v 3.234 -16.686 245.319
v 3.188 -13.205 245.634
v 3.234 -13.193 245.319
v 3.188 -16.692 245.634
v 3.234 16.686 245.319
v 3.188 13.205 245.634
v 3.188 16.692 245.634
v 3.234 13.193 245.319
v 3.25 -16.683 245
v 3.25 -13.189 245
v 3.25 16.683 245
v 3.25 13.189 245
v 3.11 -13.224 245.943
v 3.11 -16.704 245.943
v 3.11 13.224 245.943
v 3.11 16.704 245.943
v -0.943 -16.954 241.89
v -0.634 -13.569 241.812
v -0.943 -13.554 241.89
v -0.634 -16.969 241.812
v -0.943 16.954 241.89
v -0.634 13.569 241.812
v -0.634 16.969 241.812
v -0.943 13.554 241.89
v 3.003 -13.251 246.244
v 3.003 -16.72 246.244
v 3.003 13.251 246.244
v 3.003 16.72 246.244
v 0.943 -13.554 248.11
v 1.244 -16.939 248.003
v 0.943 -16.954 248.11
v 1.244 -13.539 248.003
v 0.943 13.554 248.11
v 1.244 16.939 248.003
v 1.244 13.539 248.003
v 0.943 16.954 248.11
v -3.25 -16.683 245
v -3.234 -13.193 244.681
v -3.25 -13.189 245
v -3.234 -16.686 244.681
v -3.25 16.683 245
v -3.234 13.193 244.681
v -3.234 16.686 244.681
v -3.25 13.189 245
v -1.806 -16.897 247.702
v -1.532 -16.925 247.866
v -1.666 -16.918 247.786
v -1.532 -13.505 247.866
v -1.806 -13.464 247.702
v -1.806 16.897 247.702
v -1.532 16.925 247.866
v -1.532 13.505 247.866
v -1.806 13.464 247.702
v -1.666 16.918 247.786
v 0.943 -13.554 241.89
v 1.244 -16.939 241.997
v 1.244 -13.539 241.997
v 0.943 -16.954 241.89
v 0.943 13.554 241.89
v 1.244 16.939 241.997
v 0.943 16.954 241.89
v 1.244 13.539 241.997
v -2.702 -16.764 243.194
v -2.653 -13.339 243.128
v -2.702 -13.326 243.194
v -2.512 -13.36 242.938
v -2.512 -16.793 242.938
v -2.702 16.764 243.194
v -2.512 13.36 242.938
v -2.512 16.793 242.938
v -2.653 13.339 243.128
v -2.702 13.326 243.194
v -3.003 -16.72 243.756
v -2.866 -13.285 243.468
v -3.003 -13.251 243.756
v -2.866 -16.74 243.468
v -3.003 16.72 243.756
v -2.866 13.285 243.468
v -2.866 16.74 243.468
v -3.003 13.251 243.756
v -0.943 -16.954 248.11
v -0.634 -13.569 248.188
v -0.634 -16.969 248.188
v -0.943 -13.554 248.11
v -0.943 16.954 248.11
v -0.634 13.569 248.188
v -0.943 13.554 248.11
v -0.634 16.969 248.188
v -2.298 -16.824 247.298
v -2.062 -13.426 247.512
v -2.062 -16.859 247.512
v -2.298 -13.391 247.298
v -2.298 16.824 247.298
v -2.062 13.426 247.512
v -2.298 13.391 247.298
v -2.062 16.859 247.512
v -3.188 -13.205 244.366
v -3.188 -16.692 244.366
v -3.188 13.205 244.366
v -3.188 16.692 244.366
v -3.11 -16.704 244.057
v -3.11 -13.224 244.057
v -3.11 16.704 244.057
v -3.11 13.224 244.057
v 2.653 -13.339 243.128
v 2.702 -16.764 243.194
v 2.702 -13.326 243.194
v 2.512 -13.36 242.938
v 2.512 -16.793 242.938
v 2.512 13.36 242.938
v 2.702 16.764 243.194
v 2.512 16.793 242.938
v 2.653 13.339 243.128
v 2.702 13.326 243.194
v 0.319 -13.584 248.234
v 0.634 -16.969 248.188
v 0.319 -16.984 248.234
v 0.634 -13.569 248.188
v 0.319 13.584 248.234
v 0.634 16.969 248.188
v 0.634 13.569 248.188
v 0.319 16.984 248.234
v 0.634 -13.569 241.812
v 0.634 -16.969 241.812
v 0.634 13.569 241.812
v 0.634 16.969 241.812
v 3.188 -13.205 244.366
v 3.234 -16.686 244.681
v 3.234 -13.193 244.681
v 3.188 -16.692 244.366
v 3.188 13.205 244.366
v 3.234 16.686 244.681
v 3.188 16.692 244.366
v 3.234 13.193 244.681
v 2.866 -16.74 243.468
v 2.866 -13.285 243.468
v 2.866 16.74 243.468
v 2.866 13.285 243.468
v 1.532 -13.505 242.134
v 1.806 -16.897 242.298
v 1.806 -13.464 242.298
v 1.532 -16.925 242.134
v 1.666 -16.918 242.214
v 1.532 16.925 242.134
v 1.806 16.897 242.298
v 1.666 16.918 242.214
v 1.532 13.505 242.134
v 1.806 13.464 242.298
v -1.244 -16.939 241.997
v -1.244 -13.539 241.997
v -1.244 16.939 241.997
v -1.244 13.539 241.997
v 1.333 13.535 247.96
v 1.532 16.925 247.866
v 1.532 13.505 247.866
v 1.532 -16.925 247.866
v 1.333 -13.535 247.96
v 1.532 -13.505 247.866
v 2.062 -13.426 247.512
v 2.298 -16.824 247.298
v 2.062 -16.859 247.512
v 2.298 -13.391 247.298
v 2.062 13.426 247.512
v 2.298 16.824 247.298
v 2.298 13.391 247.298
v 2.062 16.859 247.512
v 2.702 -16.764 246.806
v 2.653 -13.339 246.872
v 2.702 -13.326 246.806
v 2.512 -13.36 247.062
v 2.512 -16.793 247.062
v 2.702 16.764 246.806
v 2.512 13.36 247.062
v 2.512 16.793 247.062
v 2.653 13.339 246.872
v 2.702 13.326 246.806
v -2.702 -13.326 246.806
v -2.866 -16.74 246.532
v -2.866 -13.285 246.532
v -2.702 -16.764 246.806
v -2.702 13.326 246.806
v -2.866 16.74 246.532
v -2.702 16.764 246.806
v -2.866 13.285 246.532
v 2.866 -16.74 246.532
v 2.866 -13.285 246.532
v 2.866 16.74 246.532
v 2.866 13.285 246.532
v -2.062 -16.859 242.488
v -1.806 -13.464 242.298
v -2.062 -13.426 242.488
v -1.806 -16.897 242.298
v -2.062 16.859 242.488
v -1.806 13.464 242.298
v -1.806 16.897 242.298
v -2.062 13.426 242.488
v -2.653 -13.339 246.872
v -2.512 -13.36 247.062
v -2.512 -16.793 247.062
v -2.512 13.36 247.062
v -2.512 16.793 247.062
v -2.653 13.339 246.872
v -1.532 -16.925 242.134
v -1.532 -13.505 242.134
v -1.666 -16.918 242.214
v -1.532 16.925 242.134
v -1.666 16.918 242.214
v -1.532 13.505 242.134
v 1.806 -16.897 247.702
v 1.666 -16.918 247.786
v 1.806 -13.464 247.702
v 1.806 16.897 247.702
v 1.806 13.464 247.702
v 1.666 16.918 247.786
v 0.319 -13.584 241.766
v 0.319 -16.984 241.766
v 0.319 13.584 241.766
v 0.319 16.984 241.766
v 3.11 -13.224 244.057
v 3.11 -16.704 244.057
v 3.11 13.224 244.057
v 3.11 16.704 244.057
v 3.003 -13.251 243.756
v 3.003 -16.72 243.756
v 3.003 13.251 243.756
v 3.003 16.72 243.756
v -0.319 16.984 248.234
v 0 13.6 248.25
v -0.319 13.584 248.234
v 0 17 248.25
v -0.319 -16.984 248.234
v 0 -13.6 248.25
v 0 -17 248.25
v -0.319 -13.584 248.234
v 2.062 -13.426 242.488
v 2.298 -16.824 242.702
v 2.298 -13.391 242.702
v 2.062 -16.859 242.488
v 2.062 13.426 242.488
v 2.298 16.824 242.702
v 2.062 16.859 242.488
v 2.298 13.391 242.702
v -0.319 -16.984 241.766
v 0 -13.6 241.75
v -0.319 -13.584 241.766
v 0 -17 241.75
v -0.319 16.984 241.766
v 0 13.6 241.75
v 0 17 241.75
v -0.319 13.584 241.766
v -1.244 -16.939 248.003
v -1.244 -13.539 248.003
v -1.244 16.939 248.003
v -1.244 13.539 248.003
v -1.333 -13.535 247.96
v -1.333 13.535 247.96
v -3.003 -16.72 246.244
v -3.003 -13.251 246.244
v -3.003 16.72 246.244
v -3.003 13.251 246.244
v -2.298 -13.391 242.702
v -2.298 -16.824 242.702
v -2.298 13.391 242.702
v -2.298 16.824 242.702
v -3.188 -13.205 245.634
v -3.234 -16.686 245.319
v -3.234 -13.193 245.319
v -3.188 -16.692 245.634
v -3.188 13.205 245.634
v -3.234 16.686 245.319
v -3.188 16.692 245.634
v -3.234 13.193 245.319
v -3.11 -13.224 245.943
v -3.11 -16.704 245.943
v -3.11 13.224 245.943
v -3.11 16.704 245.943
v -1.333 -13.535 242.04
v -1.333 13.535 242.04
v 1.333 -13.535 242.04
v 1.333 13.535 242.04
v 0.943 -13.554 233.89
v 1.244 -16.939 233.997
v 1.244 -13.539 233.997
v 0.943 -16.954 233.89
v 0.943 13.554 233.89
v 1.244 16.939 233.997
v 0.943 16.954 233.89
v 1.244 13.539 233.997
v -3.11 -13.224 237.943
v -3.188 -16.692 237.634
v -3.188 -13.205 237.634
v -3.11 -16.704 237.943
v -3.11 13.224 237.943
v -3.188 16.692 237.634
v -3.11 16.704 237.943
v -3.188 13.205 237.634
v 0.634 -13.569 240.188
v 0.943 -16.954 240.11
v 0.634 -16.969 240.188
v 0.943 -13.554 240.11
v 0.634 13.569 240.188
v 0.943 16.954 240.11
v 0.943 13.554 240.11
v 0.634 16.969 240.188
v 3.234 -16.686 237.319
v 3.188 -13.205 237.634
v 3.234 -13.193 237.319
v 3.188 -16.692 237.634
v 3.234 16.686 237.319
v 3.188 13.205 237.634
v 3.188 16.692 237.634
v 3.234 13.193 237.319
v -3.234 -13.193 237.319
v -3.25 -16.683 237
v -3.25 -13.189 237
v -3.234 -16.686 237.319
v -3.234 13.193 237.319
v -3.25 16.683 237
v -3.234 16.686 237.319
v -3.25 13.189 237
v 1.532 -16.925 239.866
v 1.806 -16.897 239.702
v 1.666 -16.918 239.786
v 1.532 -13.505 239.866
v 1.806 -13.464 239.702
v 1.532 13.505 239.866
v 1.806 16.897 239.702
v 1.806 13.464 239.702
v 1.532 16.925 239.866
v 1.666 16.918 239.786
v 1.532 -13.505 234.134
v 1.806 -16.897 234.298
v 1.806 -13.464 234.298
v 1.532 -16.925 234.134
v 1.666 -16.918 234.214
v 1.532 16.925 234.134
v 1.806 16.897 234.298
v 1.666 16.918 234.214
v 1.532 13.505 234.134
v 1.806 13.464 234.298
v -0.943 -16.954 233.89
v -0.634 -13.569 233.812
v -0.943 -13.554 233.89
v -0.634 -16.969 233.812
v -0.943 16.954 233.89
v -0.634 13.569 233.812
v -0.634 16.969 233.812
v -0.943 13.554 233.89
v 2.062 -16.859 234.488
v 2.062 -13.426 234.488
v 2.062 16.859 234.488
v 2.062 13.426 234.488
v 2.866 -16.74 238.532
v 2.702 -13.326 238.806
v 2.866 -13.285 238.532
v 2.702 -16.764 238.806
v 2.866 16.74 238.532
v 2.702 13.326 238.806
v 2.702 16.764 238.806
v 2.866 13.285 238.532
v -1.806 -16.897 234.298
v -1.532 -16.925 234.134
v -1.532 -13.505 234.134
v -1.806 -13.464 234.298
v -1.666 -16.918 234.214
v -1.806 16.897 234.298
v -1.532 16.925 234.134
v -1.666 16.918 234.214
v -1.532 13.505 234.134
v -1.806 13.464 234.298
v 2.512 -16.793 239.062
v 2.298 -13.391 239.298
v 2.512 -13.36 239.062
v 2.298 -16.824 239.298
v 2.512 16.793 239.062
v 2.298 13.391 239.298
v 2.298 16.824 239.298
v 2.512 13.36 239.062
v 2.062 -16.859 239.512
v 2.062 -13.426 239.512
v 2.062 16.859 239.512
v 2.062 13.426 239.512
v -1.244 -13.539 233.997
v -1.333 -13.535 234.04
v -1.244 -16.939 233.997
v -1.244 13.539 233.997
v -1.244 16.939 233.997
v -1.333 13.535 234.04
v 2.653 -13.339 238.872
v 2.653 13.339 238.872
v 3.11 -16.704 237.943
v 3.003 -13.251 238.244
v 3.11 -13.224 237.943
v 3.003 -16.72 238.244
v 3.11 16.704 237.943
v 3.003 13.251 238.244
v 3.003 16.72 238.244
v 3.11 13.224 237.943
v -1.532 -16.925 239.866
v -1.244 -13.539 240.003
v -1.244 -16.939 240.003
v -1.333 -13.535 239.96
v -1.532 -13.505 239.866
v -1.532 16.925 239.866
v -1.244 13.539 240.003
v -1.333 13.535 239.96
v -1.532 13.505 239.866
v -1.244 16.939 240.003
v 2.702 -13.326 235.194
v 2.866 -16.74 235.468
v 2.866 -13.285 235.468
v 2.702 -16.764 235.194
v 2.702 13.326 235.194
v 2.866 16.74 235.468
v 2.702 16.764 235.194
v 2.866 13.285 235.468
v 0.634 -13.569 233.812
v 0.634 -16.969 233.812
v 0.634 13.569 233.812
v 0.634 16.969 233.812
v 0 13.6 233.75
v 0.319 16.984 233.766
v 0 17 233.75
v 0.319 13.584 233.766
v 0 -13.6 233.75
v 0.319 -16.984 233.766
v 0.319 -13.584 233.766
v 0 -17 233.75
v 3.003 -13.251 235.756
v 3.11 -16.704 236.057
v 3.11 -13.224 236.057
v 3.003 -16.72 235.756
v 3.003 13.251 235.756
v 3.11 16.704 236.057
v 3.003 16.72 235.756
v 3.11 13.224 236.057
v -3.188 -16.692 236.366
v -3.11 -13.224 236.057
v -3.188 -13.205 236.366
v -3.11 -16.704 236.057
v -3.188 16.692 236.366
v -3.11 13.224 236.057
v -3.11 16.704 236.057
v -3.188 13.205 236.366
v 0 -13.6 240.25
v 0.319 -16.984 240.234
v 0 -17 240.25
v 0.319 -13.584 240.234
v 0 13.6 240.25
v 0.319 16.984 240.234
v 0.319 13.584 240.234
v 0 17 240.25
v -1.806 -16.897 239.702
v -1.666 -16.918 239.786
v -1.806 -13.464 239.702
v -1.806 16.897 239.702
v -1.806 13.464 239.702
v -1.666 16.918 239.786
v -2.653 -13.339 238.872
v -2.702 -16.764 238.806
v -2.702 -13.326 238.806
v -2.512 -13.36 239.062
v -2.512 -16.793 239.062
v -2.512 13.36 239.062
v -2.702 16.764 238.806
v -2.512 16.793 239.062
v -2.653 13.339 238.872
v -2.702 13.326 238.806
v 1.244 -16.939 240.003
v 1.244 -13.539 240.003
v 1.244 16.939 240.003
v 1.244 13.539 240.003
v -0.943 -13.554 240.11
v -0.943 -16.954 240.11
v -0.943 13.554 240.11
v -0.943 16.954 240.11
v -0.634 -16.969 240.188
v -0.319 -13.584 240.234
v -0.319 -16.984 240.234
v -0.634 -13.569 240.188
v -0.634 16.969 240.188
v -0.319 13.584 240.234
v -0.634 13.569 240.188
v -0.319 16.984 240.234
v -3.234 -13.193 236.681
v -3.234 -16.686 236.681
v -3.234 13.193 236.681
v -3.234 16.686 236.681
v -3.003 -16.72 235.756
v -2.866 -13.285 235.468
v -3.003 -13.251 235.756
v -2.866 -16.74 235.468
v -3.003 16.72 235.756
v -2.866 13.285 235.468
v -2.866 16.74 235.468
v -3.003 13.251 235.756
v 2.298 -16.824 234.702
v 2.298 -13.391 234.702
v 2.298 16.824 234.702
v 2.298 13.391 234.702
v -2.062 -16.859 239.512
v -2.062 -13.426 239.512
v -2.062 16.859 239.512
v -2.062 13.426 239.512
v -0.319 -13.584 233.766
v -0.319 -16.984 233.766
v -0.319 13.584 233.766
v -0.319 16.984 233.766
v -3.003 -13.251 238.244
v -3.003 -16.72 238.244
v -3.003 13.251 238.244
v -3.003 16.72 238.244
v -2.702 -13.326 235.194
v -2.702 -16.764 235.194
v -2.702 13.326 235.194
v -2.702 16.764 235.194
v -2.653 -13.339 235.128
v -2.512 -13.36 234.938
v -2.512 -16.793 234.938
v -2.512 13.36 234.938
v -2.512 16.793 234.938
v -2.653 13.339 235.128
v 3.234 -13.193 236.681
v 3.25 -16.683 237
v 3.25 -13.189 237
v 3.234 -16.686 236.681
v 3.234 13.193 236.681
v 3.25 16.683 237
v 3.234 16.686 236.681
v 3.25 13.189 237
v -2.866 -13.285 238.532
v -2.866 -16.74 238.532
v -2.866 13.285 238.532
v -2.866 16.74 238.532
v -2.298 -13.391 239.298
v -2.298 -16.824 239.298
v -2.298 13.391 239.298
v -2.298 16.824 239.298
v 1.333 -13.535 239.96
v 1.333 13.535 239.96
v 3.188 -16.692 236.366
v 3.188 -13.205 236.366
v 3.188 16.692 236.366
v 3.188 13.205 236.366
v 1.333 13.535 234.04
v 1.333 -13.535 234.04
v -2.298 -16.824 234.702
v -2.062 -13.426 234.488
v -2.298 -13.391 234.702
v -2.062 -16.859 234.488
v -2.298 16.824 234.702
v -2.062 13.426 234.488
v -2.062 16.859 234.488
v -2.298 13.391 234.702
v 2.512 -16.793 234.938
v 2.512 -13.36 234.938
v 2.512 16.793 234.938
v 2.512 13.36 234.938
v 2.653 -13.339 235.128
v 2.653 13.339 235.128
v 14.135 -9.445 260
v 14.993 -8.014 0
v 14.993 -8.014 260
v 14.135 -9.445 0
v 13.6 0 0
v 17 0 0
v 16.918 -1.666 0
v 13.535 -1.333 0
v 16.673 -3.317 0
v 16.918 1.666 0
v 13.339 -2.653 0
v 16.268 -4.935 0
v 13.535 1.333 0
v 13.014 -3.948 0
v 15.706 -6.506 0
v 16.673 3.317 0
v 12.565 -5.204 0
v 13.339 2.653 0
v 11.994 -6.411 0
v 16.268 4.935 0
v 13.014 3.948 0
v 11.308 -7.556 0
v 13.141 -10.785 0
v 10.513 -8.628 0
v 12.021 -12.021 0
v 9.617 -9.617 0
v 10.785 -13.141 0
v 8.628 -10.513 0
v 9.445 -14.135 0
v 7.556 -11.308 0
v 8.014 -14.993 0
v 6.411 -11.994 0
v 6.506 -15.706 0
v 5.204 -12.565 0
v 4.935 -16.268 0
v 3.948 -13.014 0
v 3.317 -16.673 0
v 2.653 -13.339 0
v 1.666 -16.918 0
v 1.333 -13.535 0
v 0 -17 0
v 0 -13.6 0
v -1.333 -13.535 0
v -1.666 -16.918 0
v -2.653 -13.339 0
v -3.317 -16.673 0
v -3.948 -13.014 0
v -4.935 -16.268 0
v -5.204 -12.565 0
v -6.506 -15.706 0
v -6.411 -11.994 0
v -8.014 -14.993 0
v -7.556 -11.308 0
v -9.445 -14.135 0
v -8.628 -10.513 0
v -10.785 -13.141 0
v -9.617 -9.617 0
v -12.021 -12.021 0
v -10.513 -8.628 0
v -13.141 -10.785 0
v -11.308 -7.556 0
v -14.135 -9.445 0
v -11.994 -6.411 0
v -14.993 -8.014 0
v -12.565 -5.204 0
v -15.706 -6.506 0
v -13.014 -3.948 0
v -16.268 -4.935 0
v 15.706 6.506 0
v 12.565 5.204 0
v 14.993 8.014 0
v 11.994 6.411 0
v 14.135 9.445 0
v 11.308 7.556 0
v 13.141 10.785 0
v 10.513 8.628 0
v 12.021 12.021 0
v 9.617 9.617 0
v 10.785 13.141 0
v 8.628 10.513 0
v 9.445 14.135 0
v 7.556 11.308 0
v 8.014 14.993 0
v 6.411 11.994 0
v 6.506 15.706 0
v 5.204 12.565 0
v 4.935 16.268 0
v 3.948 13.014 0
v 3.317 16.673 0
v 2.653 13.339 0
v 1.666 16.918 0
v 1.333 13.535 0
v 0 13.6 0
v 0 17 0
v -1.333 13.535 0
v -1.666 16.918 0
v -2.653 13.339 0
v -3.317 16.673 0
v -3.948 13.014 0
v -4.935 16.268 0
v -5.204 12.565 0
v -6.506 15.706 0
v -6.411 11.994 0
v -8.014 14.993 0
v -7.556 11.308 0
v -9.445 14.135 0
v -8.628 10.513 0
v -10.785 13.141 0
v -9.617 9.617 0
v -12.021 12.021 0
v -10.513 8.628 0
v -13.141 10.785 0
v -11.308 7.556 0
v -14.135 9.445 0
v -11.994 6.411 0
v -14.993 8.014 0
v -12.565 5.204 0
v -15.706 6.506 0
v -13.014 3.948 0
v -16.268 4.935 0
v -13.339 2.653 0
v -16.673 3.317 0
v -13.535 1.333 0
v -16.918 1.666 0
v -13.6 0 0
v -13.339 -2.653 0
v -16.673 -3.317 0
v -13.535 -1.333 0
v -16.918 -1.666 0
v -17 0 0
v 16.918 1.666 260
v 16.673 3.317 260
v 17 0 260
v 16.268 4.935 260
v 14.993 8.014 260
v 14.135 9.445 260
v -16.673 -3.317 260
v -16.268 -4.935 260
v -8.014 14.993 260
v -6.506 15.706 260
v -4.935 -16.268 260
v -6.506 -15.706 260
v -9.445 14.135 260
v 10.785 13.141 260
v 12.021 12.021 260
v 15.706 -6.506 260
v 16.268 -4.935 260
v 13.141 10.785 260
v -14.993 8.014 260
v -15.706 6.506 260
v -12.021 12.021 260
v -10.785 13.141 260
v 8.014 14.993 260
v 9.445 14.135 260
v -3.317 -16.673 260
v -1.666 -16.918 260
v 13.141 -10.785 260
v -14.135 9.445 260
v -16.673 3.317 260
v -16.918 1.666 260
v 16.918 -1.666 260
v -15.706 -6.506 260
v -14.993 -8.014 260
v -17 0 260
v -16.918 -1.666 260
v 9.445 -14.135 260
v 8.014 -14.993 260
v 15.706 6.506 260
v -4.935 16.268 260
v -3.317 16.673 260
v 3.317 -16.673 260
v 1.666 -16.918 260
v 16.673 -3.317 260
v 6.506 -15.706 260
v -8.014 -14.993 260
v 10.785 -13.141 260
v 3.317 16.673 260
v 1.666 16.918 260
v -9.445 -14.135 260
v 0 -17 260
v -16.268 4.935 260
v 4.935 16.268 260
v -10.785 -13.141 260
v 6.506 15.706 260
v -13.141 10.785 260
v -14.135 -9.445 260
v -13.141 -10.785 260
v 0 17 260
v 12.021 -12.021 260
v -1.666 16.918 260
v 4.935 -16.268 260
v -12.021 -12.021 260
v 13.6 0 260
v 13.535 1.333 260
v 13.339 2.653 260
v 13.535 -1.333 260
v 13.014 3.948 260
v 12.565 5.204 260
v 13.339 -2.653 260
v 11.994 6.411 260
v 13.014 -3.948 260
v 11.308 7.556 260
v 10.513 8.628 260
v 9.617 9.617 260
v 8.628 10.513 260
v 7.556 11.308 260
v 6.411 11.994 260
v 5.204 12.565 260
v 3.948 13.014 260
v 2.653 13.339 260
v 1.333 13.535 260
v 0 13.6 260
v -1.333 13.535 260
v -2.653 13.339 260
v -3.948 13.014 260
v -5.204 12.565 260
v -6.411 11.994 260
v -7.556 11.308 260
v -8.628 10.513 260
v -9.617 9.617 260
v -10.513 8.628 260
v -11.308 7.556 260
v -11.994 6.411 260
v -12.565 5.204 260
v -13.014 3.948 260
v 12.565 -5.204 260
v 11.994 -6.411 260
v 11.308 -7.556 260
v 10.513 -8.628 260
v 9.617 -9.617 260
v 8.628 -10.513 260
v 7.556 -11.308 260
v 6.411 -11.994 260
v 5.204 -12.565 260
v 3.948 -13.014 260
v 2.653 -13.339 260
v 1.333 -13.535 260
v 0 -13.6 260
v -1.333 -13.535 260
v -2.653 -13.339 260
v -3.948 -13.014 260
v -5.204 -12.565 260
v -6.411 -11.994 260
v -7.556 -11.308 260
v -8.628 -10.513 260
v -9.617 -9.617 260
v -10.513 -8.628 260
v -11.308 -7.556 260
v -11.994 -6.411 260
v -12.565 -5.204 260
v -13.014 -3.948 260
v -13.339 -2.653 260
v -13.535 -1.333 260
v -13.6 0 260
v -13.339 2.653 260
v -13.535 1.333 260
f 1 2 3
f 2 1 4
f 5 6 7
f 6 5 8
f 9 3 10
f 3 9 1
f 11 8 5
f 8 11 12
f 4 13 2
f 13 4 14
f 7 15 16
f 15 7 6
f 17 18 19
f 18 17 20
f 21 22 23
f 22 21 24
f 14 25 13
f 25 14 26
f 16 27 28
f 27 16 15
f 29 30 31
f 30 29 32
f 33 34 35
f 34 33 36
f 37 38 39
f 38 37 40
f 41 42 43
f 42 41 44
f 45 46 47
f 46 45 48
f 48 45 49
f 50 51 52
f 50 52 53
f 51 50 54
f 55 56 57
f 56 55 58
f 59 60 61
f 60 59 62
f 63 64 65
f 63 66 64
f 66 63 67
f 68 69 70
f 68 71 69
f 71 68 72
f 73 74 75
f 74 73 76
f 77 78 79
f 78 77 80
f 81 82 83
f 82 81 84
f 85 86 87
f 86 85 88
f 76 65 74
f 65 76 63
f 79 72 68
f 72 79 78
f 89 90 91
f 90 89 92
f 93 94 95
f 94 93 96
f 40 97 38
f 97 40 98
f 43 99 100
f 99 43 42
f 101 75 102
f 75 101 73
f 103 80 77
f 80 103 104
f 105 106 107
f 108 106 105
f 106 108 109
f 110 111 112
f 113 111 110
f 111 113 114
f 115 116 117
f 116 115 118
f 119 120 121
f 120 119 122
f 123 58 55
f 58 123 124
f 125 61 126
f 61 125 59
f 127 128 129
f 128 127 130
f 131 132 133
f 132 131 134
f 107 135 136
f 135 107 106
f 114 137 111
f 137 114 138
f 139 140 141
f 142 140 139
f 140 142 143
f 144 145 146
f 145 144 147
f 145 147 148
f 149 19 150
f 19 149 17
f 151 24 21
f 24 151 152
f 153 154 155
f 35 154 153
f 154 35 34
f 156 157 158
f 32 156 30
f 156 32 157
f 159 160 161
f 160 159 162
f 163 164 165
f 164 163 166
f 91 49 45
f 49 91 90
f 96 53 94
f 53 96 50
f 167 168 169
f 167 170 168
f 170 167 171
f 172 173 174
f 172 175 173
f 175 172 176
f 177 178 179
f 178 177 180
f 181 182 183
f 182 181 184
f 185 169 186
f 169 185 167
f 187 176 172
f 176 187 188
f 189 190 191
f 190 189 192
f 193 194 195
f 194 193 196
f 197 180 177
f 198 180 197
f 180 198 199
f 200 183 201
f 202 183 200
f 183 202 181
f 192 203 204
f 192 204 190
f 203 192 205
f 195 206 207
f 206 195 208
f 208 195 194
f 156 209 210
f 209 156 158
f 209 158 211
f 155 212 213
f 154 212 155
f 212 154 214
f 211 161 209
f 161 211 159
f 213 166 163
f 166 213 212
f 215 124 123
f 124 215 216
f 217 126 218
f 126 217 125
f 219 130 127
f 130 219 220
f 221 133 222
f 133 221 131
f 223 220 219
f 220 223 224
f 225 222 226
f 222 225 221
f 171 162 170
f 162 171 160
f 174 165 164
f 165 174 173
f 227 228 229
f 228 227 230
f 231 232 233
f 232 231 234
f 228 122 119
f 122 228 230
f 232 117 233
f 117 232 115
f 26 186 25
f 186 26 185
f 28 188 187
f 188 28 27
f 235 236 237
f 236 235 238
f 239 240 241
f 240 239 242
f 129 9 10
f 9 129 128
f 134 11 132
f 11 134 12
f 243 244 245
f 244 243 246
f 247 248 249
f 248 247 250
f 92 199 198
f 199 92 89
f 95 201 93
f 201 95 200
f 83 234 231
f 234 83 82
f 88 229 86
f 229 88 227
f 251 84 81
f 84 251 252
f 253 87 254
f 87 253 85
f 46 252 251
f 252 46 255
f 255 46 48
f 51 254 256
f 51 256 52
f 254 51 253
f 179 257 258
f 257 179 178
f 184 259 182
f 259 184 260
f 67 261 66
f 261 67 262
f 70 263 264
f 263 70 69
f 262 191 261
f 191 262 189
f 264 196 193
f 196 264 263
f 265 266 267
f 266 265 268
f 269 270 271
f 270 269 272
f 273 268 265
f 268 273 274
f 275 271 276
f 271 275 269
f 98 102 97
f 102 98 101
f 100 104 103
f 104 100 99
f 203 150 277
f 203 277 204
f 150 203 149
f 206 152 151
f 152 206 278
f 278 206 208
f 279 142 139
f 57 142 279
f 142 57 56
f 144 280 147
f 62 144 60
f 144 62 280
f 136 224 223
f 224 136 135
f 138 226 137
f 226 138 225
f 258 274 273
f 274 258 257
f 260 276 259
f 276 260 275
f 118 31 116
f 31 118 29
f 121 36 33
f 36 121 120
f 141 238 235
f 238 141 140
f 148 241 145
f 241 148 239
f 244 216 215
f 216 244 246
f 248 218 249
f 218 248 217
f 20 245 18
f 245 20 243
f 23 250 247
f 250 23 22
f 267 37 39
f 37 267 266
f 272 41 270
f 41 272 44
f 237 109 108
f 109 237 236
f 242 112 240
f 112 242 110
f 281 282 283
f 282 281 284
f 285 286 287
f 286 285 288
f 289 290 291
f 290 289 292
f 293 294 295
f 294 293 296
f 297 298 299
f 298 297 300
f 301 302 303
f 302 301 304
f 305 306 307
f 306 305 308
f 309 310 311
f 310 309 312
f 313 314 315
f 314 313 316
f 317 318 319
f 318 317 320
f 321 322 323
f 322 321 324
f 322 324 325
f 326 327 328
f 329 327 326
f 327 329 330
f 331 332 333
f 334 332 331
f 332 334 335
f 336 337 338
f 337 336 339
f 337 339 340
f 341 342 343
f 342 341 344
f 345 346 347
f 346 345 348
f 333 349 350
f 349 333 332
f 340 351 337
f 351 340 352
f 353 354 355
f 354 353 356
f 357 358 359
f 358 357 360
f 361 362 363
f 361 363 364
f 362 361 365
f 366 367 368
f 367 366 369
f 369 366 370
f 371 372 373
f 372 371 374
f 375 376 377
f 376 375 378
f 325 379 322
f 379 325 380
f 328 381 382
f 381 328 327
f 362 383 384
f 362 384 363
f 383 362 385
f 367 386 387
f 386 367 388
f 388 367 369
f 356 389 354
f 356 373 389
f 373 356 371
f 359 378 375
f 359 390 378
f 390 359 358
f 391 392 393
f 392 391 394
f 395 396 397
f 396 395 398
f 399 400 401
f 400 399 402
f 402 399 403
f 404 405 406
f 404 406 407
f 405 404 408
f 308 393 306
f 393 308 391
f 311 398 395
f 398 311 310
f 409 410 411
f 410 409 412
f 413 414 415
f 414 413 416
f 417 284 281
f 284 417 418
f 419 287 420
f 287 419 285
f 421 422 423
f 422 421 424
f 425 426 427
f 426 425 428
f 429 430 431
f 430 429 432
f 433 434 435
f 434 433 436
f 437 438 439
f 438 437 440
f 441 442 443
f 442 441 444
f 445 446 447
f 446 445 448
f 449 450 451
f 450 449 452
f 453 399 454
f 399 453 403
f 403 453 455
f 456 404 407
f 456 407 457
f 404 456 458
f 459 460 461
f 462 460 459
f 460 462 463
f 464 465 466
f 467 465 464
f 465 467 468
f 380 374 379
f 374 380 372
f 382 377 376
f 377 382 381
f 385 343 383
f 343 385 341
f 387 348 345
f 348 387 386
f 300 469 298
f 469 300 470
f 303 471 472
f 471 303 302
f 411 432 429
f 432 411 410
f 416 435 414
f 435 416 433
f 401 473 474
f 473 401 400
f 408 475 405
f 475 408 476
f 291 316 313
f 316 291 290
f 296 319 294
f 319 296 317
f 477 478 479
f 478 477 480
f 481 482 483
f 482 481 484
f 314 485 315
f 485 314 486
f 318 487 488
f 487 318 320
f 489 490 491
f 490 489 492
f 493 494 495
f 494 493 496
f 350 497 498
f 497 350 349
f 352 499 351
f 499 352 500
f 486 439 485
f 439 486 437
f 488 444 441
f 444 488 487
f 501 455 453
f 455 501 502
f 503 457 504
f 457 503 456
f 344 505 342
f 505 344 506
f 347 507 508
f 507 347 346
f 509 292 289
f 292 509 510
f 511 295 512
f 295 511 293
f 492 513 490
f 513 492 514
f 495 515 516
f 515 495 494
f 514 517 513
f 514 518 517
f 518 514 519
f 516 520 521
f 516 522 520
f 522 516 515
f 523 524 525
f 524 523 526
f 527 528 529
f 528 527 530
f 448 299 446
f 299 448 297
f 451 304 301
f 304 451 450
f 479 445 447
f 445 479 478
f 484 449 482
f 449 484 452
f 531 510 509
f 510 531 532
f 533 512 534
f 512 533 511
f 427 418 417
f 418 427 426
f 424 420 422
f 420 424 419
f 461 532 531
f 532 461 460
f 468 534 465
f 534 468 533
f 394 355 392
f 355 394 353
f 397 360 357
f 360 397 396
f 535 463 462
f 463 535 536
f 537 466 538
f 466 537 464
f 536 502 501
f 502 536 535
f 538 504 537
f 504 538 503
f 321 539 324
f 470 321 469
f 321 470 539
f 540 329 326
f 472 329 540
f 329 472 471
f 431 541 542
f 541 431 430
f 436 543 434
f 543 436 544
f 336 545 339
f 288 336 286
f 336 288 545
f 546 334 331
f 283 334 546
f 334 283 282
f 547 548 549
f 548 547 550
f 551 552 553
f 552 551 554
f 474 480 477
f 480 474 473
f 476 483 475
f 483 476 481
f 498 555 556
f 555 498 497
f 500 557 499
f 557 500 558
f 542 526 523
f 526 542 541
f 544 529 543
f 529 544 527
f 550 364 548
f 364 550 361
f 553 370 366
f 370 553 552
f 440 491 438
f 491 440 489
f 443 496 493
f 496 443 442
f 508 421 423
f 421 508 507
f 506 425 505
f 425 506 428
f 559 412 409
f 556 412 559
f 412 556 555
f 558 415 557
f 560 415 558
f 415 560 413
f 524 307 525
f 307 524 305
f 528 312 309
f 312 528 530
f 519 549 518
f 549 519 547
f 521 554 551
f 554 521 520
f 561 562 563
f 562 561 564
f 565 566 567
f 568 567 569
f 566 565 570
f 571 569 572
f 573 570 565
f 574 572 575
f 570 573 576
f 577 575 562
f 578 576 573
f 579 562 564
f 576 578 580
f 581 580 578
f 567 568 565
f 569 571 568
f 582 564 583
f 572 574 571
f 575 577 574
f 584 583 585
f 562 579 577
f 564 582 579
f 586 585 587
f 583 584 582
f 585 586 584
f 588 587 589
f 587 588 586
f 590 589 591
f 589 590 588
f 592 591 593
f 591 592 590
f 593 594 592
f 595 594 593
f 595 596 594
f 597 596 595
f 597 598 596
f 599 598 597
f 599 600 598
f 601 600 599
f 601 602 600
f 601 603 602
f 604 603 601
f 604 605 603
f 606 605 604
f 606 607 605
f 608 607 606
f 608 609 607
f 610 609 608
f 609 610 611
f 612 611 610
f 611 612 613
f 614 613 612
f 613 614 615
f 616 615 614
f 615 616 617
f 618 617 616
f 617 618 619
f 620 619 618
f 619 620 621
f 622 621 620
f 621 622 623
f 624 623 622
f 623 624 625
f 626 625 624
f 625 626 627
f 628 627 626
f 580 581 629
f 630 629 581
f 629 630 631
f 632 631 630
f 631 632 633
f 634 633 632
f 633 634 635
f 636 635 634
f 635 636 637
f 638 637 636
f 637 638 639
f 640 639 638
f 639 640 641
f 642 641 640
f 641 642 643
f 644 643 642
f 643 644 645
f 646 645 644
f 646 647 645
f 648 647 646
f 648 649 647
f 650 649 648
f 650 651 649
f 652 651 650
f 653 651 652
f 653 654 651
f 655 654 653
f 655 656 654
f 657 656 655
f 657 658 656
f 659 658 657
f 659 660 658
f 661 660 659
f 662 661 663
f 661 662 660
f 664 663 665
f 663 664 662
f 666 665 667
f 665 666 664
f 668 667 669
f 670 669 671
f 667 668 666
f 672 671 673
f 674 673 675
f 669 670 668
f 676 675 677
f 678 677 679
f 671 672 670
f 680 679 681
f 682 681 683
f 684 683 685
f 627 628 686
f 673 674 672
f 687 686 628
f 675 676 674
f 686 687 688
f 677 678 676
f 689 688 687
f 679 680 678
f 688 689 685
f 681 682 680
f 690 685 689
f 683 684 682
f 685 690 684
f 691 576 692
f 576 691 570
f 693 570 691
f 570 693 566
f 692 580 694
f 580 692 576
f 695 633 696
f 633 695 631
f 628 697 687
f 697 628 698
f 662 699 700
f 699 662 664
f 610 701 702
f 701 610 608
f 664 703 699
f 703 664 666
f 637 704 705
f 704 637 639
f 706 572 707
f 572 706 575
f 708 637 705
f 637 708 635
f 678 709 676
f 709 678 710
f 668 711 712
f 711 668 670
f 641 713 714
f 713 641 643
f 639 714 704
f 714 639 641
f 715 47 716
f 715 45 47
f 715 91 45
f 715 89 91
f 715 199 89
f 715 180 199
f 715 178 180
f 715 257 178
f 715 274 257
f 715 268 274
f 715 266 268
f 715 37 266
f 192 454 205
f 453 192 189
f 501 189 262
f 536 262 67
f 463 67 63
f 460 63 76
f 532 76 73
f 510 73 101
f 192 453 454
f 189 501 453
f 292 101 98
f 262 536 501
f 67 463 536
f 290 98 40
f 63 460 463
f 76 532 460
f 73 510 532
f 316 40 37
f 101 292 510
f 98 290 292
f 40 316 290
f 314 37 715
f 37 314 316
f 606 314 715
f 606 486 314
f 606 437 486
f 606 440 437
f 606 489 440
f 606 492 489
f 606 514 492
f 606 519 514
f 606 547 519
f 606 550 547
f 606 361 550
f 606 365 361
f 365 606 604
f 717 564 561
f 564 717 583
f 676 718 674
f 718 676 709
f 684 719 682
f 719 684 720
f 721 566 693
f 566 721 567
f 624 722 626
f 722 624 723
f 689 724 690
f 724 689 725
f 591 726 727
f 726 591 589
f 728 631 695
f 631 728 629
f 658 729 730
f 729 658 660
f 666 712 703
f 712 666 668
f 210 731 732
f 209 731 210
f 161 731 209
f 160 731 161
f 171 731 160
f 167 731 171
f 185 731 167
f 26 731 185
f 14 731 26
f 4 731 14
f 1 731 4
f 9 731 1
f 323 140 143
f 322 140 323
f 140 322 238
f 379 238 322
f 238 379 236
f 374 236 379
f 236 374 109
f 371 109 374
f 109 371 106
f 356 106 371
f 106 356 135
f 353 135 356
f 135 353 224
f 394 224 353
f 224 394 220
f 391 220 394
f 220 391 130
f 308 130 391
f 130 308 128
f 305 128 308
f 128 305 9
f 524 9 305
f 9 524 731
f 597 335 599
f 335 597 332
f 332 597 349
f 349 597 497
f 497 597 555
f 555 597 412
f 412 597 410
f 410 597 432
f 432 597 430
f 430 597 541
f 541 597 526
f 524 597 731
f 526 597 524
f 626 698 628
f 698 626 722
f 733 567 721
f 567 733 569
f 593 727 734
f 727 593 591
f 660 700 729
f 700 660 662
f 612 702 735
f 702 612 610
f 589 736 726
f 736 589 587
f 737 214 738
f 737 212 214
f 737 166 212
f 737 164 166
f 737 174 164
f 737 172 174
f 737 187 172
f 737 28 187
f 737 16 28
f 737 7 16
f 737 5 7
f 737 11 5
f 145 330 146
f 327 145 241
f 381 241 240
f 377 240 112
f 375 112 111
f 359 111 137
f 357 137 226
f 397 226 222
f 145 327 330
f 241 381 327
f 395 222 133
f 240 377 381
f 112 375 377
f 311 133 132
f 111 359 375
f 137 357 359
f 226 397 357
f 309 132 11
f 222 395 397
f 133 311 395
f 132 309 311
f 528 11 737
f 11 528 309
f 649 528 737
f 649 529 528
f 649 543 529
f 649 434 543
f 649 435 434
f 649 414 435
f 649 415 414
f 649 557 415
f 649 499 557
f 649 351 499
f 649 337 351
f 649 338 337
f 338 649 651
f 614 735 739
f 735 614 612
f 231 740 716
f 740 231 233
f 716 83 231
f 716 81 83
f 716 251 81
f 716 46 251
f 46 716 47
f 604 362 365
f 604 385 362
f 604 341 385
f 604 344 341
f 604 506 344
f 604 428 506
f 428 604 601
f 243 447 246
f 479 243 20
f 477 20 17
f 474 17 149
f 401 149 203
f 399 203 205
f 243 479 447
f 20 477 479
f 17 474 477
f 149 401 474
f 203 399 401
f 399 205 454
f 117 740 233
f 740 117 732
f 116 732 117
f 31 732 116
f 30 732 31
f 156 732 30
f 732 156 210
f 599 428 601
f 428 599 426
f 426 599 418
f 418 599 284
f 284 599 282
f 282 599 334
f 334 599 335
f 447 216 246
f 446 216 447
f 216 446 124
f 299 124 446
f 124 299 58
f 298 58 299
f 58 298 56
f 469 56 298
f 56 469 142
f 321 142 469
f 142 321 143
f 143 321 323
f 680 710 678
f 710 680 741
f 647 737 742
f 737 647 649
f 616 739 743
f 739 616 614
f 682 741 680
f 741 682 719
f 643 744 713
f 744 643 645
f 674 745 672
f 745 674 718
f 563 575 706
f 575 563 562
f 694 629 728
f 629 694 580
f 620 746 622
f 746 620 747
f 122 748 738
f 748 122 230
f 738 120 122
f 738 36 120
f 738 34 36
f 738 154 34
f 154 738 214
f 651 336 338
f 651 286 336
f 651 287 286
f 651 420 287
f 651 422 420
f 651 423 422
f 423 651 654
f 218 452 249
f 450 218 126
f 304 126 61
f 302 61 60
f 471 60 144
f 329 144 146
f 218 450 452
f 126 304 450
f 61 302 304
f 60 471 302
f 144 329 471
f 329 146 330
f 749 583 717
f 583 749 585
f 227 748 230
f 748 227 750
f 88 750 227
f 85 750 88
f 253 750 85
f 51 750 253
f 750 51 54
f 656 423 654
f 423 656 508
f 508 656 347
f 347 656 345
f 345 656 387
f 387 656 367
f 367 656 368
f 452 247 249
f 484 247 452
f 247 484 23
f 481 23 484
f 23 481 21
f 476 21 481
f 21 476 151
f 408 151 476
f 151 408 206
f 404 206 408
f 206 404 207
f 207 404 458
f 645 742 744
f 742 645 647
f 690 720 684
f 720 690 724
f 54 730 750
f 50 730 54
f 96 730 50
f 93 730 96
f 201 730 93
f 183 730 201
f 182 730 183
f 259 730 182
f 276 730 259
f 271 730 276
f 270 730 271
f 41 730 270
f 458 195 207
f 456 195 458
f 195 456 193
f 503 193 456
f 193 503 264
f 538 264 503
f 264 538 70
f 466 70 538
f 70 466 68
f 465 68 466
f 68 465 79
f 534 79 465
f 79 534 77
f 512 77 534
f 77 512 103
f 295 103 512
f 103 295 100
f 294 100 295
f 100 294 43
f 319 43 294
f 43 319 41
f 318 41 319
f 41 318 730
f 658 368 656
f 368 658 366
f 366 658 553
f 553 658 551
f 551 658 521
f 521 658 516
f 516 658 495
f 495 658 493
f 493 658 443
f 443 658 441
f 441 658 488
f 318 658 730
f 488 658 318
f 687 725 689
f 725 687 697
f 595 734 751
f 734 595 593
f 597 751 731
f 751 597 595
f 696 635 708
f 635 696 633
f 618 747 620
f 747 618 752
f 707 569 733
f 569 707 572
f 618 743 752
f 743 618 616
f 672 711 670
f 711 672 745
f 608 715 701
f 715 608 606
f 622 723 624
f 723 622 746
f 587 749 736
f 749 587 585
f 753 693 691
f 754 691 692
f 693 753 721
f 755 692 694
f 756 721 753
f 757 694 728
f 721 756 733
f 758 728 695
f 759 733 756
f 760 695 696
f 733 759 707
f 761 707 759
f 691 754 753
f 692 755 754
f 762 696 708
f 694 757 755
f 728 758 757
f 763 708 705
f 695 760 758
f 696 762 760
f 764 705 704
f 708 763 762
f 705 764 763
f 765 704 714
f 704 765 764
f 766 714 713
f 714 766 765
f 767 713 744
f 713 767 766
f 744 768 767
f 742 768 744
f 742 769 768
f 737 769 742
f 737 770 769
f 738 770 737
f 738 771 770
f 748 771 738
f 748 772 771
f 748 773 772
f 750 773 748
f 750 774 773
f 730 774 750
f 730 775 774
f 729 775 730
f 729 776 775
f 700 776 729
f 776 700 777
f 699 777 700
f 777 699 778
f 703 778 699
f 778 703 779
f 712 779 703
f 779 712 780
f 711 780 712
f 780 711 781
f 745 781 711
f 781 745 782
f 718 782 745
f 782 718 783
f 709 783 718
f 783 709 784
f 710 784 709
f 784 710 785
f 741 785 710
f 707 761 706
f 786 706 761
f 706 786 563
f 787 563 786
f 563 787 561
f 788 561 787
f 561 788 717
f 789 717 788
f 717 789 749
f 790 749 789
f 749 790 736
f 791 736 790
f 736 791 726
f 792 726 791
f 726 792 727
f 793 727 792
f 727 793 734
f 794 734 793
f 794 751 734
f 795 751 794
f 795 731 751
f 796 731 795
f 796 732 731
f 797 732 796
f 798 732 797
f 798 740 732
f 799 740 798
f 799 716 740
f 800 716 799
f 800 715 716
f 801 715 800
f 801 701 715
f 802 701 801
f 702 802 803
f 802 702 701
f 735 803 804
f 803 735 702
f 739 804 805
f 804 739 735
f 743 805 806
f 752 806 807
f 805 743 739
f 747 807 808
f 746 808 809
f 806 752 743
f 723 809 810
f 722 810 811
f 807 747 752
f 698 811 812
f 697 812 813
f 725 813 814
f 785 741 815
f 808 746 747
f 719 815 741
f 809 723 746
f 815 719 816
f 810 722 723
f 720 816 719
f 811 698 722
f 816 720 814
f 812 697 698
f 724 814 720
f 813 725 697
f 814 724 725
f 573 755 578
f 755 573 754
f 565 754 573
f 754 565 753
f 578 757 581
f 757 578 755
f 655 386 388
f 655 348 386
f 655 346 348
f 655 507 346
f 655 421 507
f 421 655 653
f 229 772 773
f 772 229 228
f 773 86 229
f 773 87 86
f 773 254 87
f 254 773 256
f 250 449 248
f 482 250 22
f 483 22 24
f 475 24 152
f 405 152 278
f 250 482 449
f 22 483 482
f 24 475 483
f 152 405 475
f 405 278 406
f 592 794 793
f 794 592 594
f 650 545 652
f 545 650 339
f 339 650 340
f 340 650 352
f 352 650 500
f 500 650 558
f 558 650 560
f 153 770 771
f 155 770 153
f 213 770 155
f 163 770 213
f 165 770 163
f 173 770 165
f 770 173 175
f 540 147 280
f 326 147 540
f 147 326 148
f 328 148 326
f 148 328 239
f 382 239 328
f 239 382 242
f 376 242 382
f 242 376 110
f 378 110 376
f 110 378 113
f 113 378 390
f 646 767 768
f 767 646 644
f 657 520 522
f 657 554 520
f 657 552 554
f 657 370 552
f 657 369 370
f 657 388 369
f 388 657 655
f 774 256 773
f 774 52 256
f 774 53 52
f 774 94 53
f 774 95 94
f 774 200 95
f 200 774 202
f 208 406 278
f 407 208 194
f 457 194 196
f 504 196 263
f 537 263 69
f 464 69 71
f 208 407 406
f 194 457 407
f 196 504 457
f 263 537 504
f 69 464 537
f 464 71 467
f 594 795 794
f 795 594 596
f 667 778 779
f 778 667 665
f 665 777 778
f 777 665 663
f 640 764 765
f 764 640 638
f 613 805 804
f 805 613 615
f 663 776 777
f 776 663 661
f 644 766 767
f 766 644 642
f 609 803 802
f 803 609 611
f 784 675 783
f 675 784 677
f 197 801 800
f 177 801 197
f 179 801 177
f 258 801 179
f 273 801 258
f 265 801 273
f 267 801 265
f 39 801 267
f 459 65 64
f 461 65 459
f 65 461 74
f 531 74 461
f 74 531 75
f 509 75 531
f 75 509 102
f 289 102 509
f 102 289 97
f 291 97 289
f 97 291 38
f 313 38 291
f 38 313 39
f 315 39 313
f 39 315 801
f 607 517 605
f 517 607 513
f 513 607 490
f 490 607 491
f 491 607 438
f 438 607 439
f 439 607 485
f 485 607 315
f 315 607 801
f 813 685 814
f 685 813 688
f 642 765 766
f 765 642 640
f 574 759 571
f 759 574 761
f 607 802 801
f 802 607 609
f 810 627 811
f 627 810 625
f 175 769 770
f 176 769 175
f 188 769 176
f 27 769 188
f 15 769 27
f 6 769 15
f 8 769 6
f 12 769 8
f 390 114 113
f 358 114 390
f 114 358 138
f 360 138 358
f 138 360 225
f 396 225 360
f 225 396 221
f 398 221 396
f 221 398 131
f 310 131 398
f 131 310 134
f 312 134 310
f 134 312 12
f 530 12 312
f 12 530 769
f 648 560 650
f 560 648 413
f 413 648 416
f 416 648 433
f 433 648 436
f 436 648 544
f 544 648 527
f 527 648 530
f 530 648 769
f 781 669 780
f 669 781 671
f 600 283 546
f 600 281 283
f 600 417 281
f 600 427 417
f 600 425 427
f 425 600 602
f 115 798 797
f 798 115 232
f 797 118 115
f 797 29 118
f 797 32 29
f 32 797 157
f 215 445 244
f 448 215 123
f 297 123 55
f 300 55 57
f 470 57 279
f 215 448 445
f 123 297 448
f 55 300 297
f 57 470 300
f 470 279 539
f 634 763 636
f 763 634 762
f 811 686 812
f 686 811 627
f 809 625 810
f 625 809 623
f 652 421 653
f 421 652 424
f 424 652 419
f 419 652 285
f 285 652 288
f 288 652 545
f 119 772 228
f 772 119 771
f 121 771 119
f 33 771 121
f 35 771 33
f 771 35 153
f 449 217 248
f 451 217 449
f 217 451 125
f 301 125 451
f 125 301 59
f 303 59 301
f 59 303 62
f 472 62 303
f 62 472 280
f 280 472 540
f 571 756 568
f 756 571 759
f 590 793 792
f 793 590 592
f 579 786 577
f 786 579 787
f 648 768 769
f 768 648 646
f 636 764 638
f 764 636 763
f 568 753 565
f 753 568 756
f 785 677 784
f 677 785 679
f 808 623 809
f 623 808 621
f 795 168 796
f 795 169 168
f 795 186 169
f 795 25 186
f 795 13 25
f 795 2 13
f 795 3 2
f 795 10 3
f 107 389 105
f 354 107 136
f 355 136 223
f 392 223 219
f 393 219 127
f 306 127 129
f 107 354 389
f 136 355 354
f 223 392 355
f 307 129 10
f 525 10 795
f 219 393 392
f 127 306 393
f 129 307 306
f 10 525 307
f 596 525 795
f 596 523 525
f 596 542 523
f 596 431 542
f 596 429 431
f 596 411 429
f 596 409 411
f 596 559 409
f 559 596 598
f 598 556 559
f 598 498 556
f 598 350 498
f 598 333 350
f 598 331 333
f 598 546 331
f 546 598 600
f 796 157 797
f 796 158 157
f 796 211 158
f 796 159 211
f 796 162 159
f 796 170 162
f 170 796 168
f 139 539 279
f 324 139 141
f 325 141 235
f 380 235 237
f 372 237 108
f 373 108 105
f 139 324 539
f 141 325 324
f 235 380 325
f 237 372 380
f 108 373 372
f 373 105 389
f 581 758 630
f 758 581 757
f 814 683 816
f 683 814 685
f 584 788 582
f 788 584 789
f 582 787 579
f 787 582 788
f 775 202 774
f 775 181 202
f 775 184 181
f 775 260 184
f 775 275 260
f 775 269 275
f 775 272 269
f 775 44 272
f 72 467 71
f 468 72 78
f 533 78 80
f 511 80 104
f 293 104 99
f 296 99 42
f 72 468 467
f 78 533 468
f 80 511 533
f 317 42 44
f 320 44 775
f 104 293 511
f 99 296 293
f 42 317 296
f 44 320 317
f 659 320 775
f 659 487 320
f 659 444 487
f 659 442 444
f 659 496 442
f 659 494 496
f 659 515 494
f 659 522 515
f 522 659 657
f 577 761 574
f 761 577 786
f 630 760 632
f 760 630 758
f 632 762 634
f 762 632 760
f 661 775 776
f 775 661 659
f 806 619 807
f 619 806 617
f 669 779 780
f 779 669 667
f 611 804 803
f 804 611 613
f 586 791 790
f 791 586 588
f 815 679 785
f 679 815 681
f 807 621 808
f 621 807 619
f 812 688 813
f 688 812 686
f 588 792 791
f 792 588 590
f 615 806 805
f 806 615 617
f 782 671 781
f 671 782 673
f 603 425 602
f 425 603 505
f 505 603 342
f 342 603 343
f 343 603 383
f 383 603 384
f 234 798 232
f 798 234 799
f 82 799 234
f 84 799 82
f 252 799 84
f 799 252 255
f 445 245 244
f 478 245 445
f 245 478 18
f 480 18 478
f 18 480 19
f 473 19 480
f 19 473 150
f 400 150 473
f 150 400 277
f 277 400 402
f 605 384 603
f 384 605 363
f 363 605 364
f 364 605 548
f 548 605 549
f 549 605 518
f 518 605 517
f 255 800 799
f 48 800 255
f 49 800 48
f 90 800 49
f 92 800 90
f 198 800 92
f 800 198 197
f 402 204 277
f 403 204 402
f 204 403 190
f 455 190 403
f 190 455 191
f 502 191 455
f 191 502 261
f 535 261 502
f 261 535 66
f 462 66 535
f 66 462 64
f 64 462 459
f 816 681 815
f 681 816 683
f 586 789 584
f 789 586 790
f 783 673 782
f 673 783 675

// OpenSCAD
// file: ../../config.scad
// Ebike Configuration
// All dimensions in mm

// =============================================================================
// RIDER PARAMETERS
// =============================================================================
rider_height = 173;
rider_weight = 55;

// =============================================================================
// FRAME GEOMETRY
// =============================================================================
frame_size = 520;                    // Seat tube center-to-top
top_tube_effective = 545;
head_tube_length = 140;
head_tube_angle = 70;
seat_tube_angle = 72;
chainstay_length = 460;
bb_drop = 65;
wheelbase = 1080;
standover_height = 450;              // Step-through
stack = 620;
reach = 370;

// =============================================================================
// TUBE DIAMETERS
// =============================================================================
head_tube_id = 44;                   // 1-1/8" straight steerer
head_tube_od = 49;
seat_tube_id = 27.2;                 // Standard seatpost
down_tube_od = 44;
top_tube_od = 32;
seat_stay_od = 16;
chainstay_od = 22;

// =============================================================================
// MOTOR CONFIGURATION
// =============================================================================
motor_type = "mid-drive";
bb_shell_width = 68;                 // BSA standard
bb_clearance_width = 120;

// =============================================================================
// DROPOUT PARAMETERS
// =============================================================================
dropout_material = "6061-T6";
dropout_thickness = 10;
dropout_width = 45;
dropout_height = 80;
dropout_axle_spacing = 142;          // Boost thru-axle
dropout_axle_diameter = 12;

// =============================================================================
// BOTTOM BRACKET SHELL
// =============================================================================
bb_shell_od = 42;
bb_shell_id = 34.8;                  // BSA threaded
bb_thread_tpi = 24;                  // BSA 1.37" x 24 TPI

// =============================================================================
// HEAD TUBE
// =============================================================================
// Uses head_tube_length, head_tube_id, head_tube_od from above

// =============================================================================
// SEAT COLLAR
// =============================================================================
seat_collar_id = 31.8;               // For 27.2mm post with shim
seat_collar_od = 38;
seat_collar_height = 25;

// =============================================================================
// MOTOR MOUNT
// =============================================================================
motor_mount_thickness = 8;
motor_mount_width = 120;
motor_mount_height = 100;

// =============================================================================
// BATTERY MOUNT
// =============================================================================
battery_mount_thickness = 6;
battery_mount_width = 60;
battery_mount_height = 40;
battery_mount_quantity = 4;

// =============================================================================
// BRAKE MOUNT (Post Mount)
// =============================================================================
brake_mount_thickness = 10;
brake_mount_width = 80;
brake_mount_height = 50;
brake_post_bolt_spacing = 74;        // Post mount standard
brake_rotor_size_front = 180;
brake_rotor_size_rear = 160;

// =============================================================================
// CABLE GUIDES
// =============================================================================
cable_guide_length = 25;
cable_guide_width = 15;
cable_guide_height = 8;
cable_guide_quantity = 6;

// =============================================================================
// HEADSET CUPS
// =============================================================================
headset_cup_od = 44;
headset_bearing_seat = 30;

// =============================================================================
// RACK/FENDER MOUNTS
// =============================================================================
rack_mount_length = 30;
rack_mount_width = 20;
rack_mount_height = 10;
rack_mount_thread = 5;               // M5
rack_mount_quantity = 4;

// =============================================================================
// GUSSET PLATES
// =============================================================================
gusset_thickness = 6;
gusset_width = 80;
gusset_height = 60;
gusset_quantity = 2;

// =============================================================================
// COMPOSITE FRAME TUBES (FibreSeeker 3)
// =============================================================================
// Wall thickness for carbon fiber reinforced tubes
tube_wall_thickness = 3;

// Down tube (curved for step-through)
down_tube_length = 650;              // Along curve
down_tube_curve_radius = 800;        // Radius of curve

// Seat tube
seat_tube_length = 520;              // frame_size
seat_tube_od = 34;                   // Outer diameter

// Chainstays
chainstay_wall = 2.5;

// Seat stays
seat_stay_length = 480;
seat_stay_wall = 2;

// =============================================================================
// TUBE SECTIONING (for build volume constraints)
// =============================================================================
// Joint design: internal aluminum sleeve with M6 through-bolts
joint_overlap = 30;                  // Overlap length per joint
joint_bolt_diameter = 6;             // M6 bolts
joint_bolt_count = 2;                // Bolts per joint

// Section counts
down_tube_sections = 3;
seat_tube_sections = 2;
chainstay_sections = 2;
seat_stay_sections = 2;

// Sleeve parameters (CNC milled aluminum) - for straight tubes
sleeve_wall_thickness = 2;
sleeve_length = 60;                  // Total sleeve length (2x overlap)

// Flange joint parameters (for curved down tube)
flange_thickness = 6;
flange_width = 60;                   // Width of flange plate
flange_height = 40;                  // Height of flange plate
flange_bolt_count = 4;               // Bolts per flange pair
flange_bolt_diameter = 6;            // M6 bolts
lap_overlap = 25;                    // Tube overlap at joint

// Bolt hole cutting length (must exceed max tube OD)
bolt_hole_length = 75;

// =============================================================================
// MANUFACTURING TOLERANCES
// =============================================================================
tolerance_press_fit = 0.05;
tolerance_general = 0.1;

// =============================================================================
// COMMON CONSTANTS
// =============================================================================
$fn = 64;                            // Circle resolution
epsilon = 0.01;                      // For boolean operations
// main file
// Seat Tube
// Carbon fiber reinforced - FibreSeeker 3
// Printed in 2 sections

include <../../config.scad>

// Calculate section length
seat_tube_section_length = seat_tube_length / seat_tube_sections;

module seat_tube_section(section_num) {
    difference() {
        // Outer tube - solid cylinder
        cylinder(h = seat_tube_section_length, d = seat_tube_od);

        // Inner bore for seatpost - extends beyond ends to ensure clean cut
        translate([0, 0, -epsilon])
            cylinder(h = seat_tube_section_length + 2*epsilon, d = seat_tube_id);

        // Bolt holes for sleeve joint - properly spaced around tube
        // Bottom of section (if not first)
        if (section_num > 0) {
            for (i = [0:joint_bolt_count-1]) {
                rotate([0, 0, i * 180])  // Opposite sides
                    translate([0, 0, joint_overlap/2 + (i % 2) * 8])
                        rotate([90, 0, 0])
                            cylinder(h = bolt_hole_length, d = joint_bolt_diameter + 0.5, center = true);
            }
        }

        // Top of section (if not last)
        if (section_num < seat_tube_sections - 1) {
            for (i = [0:joint_bolt_count-1]) {
                rotate([0, 0, i * 180])  // Opposite sides
                    translate([0, 0, seat_tube_section_length - joint_overlap/2 - (i % 2) * 8])
                        rotate([90, 0, 0])
                            cylinder(h = bolt_hole_length, d = joint_bolt_diameter + 0.5, center = true);
            }
        }
    }
}

// Render section (set via -D render_section=N)
render_section = 0;  // Default for preview

seat_tube_section(render_section);
